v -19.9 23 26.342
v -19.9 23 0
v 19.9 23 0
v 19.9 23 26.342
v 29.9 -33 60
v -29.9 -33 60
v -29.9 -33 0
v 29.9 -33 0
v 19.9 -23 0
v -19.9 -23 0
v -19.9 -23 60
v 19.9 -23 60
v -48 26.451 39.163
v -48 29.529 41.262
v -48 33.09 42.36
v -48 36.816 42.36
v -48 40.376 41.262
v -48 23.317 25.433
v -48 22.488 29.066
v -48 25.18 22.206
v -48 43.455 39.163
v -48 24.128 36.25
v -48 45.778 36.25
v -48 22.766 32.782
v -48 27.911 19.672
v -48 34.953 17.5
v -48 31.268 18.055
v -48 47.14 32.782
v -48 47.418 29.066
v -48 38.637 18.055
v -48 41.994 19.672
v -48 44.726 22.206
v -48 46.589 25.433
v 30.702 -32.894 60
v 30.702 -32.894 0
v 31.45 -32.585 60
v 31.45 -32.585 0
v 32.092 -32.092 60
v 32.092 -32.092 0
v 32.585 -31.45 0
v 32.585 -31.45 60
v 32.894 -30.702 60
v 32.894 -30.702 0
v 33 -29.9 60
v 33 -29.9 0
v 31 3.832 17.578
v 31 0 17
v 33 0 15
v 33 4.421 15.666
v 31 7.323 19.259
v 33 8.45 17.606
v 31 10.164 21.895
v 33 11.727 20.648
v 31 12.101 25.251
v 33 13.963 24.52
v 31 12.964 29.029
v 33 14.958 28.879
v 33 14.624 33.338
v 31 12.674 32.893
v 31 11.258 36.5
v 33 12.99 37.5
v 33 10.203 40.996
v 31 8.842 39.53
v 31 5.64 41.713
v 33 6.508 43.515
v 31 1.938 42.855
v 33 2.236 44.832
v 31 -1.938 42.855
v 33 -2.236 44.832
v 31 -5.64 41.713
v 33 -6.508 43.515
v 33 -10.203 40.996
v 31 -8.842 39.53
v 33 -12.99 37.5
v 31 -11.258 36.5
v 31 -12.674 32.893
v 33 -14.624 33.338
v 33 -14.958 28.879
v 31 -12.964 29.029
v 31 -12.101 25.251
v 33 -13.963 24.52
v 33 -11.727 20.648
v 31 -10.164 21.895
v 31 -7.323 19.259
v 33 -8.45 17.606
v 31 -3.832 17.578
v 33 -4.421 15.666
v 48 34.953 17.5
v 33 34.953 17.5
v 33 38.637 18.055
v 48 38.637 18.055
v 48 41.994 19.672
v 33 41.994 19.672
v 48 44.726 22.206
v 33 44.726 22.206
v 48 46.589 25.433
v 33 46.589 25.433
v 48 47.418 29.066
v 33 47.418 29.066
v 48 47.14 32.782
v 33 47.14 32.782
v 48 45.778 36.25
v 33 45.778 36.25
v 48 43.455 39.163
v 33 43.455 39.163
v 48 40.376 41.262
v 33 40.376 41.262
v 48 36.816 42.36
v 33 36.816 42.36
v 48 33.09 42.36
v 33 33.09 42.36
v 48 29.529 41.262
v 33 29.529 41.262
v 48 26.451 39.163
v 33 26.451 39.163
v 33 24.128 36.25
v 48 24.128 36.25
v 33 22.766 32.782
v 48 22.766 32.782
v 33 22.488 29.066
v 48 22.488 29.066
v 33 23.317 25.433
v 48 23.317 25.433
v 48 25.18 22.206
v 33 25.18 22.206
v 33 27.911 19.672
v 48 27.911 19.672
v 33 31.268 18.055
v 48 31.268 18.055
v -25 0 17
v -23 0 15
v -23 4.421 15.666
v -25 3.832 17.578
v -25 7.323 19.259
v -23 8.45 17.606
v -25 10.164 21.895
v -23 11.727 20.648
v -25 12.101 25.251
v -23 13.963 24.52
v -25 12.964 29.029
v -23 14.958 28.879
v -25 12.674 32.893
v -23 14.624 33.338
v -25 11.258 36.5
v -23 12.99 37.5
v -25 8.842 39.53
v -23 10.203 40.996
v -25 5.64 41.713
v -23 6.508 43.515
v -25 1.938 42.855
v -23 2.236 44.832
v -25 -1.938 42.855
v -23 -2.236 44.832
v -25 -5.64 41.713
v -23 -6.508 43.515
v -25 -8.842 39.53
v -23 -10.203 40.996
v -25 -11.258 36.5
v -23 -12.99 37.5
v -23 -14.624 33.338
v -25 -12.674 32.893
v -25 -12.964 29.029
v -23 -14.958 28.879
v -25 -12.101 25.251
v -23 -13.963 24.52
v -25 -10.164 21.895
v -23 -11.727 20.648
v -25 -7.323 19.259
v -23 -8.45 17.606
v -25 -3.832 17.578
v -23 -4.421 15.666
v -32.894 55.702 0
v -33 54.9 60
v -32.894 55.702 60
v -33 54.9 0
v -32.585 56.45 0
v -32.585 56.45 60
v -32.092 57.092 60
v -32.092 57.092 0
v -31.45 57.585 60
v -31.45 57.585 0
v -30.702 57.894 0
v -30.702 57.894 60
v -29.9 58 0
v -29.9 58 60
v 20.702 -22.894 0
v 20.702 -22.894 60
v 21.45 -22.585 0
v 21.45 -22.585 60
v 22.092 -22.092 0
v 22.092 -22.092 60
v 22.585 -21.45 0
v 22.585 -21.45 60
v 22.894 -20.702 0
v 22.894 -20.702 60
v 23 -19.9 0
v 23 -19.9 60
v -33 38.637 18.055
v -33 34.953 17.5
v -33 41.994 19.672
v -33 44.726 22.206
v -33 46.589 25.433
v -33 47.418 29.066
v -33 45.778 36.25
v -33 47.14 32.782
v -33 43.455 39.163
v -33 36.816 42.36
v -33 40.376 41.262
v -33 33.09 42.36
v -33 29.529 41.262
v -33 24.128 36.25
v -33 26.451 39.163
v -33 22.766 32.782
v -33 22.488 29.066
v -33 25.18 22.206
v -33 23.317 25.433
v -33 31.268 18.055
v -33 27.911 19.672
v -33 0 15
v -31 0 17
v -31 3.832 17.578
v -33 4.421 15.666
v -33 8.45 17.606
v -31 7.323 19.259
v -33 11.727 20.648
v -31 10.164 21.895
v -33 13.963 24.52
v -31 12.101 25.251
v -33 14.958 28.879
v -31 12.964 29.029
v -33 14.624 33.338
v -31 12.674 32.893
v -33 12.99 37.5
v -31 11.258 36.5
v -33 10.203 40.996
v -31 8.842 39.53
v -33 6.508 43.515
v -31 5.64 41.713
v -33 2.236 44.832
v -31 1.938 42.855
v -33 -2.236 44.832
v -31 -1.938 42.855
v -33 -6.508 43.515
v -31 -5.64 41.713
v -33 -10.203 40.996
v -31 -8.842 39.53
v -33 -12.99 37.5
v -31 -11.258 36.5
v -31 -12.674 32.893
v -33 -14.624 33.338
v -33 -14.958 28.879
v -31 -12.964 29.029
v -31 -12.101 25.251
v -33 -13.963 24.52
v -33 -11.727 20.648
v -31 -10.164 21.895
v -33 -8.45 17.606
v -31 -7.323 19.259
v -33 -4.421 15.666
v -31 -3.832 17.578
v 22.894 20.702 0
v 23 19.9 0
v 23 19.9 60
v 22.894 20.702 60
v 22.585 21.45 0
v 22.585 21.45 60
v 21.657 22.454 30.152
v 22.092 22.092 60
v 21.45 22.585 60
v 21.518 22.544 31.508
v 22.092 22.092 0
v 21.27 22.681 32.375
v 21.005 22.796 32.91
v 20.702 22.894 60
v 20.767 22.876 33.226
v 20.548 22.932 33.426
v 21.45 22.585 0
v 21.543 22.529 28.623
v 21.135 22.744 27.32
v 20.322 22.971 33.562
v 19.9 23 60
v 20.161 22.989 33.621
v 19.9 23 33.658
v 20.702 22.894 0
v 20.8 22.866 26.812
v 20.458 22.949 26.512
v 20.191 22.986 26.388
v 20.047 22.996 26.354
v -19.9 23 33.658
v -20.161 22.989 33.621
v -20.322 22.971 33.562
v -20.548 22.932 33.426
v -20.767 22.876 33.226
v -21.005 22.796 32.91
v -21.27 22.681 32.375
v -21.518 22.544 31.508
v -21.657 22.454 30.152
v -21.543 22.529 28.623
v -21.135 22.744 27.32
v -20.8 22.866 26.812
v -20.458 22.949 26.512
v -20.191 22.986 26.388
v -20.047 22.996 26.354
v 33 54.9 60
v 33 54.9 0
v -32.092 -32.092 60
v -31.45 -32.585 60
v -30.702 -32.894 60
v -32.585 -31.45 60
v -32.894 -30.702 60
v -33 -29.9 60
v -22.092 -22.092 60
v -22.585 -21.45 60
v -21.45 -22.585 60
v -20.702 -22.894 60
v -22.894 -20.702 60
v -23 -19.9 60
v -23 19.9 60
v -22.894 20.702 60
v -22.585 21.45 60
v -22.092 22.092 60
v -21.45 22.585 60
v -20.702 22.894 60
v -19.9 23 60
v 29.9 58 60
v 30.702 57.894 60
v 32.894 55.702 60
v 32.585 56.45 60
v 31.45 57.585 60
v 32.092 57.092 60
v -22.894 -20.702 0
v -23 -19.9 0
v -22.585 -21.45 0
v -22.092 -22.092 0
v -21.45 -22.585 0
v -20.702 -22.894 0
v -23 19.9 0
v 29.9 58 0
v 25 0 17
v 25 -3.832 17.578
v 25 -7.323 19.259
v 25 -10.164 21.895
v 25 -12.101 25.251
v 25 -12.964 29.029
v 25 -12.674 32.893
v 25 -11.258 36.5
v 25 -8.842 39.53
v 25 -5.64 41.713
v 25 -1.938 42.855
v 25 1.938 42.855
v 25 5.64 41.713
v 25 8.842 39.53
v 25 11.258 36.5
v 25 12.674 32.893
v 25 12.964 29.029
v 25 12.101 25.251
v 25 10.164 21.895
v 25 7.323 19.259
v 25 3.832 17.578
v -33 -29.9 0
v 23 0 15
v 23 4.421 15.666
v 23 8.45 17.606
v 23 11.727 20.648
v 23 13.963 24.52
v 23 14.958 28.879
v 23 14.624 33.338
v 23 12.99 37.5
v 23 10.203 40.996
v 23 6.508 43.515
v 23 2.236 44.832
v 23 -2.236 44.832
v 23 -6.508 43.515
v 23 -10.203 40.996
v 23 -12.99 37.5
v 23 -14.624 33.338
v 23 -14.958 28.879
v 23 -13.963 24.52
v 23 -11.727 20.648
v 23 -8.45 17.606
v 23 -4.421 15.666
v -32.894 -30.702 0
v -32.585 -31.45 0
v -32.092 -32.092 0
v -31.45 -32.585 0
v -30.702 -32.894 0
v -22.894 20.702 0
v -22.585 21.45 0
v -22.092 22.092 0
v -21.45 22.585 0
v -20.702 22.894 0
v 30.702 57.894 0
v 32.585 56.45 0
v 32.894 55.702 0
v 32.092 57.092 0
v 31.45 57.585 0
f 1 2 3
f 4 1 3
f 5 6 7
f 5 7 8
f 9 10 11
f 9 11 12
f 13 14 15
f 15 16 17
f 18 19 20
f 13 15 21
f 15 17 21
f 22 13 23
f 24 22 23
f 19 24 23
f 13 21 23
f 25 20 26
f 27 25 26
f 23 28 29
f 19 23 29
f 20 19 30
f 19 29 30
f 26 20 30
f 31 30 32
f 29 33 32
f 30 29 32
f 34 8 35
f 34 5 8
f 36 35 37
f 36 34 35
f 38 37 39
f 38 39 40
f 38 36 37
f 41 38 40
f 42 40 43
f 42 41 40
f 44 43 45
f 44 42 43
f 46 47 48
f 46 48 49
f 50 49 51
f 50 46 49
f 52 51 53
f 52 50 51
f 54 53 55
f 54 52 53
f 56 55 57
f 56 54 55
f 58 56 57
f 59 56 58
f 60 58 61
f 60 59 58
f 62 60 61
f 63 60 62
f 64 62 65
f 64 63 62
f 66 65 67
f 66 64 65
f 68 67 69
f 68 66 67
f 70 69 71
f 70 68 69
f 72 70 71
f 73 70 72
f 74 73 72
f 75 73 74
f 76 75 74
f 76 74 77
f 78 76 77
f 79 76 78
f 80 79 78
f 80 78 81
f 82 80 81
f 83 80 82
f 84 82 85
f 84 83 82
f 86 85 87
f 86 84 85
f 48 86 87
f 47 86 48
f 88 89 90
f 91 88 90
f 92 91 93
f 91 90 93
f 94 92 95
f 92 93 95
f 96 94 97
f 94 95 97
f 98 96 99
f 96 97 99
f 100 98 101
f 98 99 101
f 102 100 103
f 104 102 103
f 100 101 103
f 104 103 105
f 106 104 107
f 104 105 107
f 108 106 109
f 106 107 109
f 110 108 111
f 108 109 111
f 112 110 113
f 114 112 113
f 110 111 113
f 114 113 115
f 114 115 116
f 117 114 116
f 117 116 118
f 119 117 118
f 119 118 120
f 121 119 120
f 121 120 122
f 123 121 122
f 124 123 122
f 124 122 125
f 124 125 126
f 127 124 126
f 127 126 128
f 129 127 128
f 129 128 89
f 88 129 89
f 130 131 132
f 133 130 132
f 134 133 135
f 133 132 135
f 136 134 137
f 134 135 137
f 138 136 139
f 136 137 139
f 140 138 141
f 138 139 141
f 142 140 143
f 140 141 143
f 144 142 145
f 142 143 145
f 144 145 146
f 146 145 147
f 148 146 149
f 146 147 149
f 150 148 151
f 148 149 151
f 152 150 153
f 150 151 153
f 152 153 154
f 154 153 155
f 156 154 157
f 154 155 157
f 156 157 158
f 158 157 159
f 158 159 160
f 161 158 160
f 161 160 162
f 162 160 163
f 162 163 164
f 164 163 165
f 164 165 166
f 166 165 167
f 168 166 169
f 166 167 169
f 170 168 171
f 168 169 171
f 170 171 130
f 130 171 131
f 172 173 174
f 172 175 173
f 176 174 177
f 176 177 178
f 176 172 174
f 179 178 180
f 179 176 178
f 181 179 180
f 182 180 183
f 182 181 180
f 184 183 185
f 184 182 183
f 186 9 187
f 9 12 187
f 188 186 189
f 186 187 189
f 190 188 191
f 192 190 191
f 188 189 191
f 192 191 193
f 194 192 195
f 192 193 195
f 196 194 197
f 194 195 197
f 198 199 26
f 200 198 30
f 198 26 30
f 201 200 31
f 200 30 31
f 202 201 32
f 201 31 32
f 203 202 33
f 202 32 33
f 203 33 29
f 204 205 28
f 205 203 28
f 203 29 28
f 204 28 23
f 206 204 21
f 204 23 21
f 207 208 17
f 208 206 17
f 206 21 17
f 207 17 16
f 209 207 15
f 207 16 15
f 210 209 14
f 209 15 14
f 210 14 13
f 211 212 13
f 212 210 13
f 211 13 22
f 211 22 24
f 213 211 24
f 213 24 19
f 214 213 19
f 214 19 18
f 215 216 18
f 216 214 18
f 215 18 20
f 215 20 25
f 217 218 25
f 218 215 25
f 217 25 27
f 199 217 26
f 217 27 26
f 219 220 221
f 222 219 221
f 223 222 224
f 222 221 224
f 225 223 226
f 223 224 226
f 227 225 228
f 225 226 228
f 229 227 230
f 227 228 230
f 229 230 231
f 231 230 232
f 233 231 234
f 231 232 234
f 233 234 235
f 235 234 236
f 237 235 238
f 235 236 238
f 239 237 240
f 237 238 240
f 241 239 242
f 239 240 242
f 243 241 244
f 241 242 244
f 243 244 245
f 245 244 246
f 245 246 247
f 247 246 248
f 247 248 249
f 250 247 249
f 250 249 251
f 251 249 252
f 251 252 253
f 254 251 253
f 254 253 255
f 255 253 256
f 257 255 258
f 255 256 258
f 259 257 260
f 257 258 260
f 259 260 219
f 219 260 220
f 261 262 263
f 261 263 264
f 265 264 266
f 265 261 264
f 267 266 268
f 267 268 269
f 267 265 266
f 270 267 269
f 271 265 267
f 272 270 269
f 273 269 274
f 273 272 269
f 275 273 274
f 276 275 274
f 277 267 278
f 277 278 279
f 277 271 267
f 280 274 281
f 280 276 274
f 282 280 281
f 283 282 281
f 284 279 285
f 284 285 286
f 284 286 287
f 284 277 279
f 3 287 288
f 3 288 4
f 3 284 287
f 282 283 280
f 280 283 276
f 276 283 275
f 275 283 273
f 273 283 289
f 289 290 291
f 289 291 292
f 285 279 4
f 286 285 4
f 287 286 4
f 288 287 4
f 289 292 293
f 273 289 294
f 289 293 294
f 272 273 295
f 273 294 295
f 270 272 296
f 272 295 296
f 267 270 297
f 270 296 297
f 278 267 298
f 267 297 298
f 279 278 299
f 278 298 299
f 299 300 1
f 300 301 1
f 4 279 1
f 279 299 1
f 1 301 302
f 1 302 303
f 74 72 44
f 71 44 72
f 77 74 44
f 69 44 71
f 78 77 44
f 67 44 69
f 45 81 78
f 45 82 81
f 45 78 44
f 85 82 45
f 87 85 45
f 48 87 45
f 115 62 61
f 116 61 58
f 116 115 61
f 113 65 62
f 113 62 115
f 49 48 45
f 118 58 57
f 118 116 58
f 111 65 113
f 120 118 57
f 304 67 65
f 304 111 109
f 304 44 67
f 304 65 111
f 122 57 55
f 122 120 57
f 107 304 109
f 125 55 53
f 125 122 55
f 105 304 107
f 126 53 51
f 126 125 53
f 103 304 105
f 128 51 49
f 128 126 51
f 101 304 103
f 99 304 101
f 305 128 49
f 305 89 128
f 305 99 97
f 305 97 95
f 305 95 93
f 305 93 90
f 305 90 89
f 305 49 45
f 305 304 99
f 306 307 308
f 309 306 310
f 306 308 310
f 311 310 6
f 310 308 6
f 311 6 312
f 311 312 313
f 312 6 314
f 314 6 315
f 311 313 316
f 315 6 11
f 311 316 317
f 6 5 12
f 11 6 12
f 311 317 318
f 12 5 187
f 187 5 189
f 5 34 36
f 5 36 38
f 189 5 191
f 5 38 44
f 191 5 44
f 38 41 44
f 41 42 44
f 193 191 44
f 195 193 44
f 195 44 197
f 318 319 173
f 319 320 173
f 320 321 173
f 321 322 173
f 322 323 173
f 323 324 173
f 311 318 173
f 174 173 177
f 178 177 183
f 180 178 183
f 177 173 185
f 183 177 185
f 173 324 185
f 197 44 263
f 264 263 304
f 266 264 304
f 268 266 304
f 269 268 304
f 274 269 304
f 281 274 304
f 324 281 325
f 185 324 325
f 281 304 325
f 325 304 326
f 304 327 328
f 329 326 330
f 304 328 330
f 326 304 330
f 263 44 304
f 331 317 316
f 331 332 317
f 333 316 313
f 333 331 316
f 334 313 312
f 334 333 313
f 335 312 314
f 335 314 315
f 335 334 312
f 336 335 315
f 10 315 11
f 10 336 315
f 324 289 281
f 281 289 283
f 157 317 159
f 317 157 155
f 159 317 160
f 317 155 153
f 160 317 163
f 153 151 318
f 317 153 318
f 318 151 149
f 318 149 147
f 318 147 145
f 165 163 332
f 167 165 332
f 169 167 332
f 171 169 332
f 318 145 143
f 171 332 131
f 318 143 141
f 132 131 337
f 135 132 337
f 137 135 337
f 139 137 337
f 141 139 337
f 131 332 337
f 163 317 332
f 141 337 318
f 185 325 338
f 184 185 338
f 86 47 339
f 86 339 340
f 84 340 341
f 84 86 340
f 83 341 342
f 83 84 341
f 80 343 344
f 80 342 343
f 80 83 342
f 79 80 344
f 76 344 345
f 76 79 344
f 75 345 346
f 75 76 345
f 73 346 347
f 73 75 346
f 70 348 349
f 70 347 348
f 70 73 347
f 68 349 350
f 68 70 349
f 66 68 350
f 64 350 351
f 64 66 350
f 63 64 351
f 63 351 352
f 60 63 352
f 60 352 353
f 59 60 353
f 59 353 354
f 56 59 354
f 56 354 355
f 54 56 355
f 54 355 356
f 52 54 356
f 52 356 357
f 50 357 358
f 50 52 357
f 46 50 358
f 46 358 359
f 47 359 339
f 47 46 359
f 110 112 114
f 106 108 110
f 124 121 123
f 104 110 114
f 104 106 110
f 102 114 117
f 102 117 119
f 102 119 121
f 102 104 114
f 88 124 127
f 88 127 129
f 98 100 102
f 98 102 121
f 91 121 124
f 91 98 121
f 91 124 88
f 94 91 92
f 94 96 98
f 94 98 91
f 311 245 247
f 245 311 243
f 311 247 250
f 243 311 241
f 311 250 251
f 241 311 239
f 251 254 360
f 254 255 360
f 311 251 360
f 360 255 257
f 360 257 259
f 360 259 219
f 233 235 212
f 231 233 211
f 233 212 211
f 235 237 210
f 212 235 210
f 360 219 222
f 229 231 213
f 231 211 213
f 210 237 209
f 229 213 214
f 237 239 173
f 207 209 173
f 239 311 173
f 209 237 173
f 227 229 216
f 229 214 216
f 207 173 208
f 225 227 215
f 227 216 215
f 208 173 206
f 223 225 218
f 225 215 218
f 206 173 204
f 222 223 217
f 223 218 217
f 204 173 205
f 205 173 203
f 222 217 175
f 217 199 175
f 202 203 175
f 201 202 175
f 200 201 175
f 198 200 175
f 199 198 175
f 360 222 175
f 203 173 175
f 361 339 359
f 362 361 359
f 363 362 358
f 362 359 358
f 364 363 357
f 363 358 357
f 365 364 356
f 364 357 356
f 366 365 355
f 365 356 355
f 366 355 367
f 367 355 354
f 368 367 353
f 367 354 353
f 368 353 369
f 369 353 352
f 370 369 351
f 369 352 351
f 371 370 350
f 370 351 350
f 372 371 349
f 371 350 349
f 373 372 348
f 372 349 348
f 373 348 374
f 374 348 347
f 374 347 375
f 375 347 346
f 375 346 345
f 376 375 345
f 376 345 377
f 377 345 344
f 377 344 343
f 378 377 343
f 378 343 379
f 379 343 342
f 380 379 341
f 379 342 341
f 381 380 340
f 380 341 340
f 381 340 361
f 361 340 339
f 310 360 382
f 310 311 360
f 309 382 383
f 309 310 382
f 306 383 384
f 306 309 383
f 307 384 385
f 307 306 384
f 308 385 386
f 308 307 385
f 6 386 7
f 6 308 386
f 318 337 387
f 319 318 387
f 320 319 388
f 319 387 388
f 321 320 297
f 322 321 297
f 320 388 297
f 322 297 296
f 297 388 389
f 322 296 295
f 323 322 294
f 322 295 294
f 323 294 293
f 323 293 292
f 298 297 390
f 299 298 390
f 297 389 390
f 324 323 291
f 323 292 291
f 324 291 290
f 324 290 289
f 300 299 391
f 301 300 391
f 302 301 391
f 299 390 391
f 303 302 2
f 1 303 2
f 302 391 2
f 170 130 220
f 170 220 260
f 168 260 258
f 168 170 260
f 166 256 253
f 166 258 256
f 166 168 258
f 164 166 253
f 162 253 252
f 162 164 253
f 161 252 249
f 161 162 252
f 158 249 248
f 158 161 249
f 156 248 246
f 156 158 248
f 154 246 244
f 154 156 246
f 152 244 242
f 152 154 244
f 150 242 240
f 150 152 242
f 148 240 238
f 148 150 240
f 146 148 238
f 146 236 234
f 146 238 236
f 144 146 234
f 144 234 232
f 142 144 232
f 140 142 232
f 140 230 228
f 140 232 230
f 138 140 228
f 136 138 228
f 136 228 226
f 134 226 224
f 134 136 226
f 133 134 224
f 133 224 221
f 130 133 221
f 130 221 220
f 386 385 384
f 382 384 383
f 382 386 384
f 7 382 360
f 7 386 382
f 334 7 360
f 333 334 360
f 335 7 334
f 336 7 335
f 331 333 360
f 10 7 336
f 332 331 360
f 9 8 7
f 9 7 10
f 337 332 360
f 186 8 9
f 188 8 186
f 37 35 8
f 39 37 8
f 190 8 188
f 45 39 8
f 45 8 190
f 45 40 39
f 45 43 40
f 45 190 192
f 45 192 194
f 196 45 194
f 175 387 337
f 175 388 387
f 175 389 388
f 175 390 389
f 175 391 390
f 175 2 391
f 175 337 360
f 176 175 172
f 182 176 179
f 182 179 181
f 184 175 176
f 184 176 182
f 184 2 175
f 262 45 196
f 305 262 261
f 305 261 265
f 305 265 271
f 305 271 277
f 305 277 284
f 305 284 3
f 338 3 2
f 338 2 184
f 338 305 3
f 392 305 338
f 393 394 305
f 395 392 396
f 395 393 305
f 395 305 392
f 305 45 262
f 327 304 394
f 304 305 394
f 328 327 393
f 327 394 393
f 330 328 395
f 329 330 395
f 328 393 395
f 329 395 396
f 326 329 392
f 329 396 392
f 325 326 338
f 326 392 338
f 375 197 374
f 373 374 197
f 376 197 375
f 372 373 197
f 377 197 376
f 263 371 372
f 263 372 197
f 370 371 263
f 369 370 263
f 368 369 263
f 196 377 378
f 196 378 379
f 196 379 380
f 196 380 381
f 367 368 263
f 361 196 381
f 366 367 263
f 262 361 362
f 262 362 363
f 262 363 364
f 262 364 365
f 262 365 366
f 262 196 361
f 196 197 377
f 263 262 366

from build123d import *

# Parameters (mm, degrees)
SKETCH1_W                = 66
SKETCH1_H                = 66
BOSS_EXTRUDE1_DEPTH      = 60
SHELL1_T                 = -10
FILLET2_R                = 3.1
SKETCH2_W                = 60
SKETCH2_H                = 25
BOSS_EXTRUDE2_DEPTH      = 66
FILLET3_R                = 3.1
BOSS_EXTRUDE4_DEPTH      = 48
BOSS_EXTRUDE4_DEPTH_BACK = 48
SKETCH3_R                = 12.5
CUT_EXTRUDE1_DEPTH       = 110.567330952
CUT_EXTRUDE1_DEPTH_BACK  = 110.567330952
SKETCH4_R                = 13
CHAMFER1_SIZE            = 2


with BuildPart() as part:
    # Sketch1 → Boss-Extrude1 (new body)
    with BuildSketch(Plane.XY):
        Rectangle(SKETCH1_W, SKETCH1_H)
    extrude(amount=BOSS_EXTRUDE1_DEPTH)

    # Shell1
    shell1_openings = [part.faces().sort_by_distance(p)[0] for p in [
        (0, 0, 60),
        (0, 0, 0),
    ]]
    offset(amount=SHELL1_T, openings=shell1_openings, kind=Kind.INTERSECTION)

    # Fillet2
    fillet2_edges = [part.edges().sort_by_distance(p)[0] for p in [
        (23, -23, 30),
        (23, 23, 30),
        (-23, 23, 30),
        (-23, -23, 30),
    ]]
    fillet(fillet2_edges, radius=FILLET2_R)

    # Sketch2 → Boss-Extrude2 (add)
    with BuildSketch(Plane(origin=(33, 0, 0), x_dir=(0, 0, -1), z_dir=(1, 0, 0))):
        with Locations((-30, 45.5)):
            Rectangle(SKETCH2_W, SKETCH2_H)
    extrude(amount=-BOSS_EXTRUDE2_DEPTH)

    # Fillet3
    fillet3_edges = [part.edges().sort_by_distance(p)[0] for p in [
        (33, 58, 30),
        (-33, 58, 30),
        (33, -33, 30),
        (-33, -33, 30),
    ]]
    fillet(fillet3_edges, radius=FILLET3_R)

    # Sketch3 → Boss-Extrude4 (add, two sides: drawn at the far end of the back side and taken through both)
    with BuildSketch(Plane(origin=(0, 0, 0), x_dir=(0, 0, -1), z_dir=(1, 0, 0)).offset(-BOSS_EXTRUDE4_DEPTH_BACK)):
        with Locations((-30, 34.952906867)):
            Circle(SKETCH3_R)
    extrude(amount=BOSS_EXTRUDE4_DEPTH + BOSS_EXTRUDE4_DEPTH_BACK)

    # Sketch4 → Cut-Extrude1 (cut, two sides: drawn at the far end of the back side and taken through both)
    with BuildSketch(Plane.ZY.offset(-23).offset(-CUT_EXTRUDE1_DEPTH_BACK)):
        with Locations(Location((30, 0, 0), (0, 0, 180))):
            Circle(SKETCH4_R)
    extrude(amount=CUT_EXTRUDE1_DEPTH + CUT_EXTRUDE1_DEPTH_BACK, mode=Mode.SUBTRACT)

    # Chamfer1
    chamfer1_edges = [part.edges().sort_by_distance(p)[0] for p in [
        (33, 0, 43),
        (-33, 0, 43),
        (-23, 0, 43),
        (23, 0, 43),
    ]]
    chamfer(chamfer1_edges, length=CHAMFER1_SIZE)


solid = part.part
